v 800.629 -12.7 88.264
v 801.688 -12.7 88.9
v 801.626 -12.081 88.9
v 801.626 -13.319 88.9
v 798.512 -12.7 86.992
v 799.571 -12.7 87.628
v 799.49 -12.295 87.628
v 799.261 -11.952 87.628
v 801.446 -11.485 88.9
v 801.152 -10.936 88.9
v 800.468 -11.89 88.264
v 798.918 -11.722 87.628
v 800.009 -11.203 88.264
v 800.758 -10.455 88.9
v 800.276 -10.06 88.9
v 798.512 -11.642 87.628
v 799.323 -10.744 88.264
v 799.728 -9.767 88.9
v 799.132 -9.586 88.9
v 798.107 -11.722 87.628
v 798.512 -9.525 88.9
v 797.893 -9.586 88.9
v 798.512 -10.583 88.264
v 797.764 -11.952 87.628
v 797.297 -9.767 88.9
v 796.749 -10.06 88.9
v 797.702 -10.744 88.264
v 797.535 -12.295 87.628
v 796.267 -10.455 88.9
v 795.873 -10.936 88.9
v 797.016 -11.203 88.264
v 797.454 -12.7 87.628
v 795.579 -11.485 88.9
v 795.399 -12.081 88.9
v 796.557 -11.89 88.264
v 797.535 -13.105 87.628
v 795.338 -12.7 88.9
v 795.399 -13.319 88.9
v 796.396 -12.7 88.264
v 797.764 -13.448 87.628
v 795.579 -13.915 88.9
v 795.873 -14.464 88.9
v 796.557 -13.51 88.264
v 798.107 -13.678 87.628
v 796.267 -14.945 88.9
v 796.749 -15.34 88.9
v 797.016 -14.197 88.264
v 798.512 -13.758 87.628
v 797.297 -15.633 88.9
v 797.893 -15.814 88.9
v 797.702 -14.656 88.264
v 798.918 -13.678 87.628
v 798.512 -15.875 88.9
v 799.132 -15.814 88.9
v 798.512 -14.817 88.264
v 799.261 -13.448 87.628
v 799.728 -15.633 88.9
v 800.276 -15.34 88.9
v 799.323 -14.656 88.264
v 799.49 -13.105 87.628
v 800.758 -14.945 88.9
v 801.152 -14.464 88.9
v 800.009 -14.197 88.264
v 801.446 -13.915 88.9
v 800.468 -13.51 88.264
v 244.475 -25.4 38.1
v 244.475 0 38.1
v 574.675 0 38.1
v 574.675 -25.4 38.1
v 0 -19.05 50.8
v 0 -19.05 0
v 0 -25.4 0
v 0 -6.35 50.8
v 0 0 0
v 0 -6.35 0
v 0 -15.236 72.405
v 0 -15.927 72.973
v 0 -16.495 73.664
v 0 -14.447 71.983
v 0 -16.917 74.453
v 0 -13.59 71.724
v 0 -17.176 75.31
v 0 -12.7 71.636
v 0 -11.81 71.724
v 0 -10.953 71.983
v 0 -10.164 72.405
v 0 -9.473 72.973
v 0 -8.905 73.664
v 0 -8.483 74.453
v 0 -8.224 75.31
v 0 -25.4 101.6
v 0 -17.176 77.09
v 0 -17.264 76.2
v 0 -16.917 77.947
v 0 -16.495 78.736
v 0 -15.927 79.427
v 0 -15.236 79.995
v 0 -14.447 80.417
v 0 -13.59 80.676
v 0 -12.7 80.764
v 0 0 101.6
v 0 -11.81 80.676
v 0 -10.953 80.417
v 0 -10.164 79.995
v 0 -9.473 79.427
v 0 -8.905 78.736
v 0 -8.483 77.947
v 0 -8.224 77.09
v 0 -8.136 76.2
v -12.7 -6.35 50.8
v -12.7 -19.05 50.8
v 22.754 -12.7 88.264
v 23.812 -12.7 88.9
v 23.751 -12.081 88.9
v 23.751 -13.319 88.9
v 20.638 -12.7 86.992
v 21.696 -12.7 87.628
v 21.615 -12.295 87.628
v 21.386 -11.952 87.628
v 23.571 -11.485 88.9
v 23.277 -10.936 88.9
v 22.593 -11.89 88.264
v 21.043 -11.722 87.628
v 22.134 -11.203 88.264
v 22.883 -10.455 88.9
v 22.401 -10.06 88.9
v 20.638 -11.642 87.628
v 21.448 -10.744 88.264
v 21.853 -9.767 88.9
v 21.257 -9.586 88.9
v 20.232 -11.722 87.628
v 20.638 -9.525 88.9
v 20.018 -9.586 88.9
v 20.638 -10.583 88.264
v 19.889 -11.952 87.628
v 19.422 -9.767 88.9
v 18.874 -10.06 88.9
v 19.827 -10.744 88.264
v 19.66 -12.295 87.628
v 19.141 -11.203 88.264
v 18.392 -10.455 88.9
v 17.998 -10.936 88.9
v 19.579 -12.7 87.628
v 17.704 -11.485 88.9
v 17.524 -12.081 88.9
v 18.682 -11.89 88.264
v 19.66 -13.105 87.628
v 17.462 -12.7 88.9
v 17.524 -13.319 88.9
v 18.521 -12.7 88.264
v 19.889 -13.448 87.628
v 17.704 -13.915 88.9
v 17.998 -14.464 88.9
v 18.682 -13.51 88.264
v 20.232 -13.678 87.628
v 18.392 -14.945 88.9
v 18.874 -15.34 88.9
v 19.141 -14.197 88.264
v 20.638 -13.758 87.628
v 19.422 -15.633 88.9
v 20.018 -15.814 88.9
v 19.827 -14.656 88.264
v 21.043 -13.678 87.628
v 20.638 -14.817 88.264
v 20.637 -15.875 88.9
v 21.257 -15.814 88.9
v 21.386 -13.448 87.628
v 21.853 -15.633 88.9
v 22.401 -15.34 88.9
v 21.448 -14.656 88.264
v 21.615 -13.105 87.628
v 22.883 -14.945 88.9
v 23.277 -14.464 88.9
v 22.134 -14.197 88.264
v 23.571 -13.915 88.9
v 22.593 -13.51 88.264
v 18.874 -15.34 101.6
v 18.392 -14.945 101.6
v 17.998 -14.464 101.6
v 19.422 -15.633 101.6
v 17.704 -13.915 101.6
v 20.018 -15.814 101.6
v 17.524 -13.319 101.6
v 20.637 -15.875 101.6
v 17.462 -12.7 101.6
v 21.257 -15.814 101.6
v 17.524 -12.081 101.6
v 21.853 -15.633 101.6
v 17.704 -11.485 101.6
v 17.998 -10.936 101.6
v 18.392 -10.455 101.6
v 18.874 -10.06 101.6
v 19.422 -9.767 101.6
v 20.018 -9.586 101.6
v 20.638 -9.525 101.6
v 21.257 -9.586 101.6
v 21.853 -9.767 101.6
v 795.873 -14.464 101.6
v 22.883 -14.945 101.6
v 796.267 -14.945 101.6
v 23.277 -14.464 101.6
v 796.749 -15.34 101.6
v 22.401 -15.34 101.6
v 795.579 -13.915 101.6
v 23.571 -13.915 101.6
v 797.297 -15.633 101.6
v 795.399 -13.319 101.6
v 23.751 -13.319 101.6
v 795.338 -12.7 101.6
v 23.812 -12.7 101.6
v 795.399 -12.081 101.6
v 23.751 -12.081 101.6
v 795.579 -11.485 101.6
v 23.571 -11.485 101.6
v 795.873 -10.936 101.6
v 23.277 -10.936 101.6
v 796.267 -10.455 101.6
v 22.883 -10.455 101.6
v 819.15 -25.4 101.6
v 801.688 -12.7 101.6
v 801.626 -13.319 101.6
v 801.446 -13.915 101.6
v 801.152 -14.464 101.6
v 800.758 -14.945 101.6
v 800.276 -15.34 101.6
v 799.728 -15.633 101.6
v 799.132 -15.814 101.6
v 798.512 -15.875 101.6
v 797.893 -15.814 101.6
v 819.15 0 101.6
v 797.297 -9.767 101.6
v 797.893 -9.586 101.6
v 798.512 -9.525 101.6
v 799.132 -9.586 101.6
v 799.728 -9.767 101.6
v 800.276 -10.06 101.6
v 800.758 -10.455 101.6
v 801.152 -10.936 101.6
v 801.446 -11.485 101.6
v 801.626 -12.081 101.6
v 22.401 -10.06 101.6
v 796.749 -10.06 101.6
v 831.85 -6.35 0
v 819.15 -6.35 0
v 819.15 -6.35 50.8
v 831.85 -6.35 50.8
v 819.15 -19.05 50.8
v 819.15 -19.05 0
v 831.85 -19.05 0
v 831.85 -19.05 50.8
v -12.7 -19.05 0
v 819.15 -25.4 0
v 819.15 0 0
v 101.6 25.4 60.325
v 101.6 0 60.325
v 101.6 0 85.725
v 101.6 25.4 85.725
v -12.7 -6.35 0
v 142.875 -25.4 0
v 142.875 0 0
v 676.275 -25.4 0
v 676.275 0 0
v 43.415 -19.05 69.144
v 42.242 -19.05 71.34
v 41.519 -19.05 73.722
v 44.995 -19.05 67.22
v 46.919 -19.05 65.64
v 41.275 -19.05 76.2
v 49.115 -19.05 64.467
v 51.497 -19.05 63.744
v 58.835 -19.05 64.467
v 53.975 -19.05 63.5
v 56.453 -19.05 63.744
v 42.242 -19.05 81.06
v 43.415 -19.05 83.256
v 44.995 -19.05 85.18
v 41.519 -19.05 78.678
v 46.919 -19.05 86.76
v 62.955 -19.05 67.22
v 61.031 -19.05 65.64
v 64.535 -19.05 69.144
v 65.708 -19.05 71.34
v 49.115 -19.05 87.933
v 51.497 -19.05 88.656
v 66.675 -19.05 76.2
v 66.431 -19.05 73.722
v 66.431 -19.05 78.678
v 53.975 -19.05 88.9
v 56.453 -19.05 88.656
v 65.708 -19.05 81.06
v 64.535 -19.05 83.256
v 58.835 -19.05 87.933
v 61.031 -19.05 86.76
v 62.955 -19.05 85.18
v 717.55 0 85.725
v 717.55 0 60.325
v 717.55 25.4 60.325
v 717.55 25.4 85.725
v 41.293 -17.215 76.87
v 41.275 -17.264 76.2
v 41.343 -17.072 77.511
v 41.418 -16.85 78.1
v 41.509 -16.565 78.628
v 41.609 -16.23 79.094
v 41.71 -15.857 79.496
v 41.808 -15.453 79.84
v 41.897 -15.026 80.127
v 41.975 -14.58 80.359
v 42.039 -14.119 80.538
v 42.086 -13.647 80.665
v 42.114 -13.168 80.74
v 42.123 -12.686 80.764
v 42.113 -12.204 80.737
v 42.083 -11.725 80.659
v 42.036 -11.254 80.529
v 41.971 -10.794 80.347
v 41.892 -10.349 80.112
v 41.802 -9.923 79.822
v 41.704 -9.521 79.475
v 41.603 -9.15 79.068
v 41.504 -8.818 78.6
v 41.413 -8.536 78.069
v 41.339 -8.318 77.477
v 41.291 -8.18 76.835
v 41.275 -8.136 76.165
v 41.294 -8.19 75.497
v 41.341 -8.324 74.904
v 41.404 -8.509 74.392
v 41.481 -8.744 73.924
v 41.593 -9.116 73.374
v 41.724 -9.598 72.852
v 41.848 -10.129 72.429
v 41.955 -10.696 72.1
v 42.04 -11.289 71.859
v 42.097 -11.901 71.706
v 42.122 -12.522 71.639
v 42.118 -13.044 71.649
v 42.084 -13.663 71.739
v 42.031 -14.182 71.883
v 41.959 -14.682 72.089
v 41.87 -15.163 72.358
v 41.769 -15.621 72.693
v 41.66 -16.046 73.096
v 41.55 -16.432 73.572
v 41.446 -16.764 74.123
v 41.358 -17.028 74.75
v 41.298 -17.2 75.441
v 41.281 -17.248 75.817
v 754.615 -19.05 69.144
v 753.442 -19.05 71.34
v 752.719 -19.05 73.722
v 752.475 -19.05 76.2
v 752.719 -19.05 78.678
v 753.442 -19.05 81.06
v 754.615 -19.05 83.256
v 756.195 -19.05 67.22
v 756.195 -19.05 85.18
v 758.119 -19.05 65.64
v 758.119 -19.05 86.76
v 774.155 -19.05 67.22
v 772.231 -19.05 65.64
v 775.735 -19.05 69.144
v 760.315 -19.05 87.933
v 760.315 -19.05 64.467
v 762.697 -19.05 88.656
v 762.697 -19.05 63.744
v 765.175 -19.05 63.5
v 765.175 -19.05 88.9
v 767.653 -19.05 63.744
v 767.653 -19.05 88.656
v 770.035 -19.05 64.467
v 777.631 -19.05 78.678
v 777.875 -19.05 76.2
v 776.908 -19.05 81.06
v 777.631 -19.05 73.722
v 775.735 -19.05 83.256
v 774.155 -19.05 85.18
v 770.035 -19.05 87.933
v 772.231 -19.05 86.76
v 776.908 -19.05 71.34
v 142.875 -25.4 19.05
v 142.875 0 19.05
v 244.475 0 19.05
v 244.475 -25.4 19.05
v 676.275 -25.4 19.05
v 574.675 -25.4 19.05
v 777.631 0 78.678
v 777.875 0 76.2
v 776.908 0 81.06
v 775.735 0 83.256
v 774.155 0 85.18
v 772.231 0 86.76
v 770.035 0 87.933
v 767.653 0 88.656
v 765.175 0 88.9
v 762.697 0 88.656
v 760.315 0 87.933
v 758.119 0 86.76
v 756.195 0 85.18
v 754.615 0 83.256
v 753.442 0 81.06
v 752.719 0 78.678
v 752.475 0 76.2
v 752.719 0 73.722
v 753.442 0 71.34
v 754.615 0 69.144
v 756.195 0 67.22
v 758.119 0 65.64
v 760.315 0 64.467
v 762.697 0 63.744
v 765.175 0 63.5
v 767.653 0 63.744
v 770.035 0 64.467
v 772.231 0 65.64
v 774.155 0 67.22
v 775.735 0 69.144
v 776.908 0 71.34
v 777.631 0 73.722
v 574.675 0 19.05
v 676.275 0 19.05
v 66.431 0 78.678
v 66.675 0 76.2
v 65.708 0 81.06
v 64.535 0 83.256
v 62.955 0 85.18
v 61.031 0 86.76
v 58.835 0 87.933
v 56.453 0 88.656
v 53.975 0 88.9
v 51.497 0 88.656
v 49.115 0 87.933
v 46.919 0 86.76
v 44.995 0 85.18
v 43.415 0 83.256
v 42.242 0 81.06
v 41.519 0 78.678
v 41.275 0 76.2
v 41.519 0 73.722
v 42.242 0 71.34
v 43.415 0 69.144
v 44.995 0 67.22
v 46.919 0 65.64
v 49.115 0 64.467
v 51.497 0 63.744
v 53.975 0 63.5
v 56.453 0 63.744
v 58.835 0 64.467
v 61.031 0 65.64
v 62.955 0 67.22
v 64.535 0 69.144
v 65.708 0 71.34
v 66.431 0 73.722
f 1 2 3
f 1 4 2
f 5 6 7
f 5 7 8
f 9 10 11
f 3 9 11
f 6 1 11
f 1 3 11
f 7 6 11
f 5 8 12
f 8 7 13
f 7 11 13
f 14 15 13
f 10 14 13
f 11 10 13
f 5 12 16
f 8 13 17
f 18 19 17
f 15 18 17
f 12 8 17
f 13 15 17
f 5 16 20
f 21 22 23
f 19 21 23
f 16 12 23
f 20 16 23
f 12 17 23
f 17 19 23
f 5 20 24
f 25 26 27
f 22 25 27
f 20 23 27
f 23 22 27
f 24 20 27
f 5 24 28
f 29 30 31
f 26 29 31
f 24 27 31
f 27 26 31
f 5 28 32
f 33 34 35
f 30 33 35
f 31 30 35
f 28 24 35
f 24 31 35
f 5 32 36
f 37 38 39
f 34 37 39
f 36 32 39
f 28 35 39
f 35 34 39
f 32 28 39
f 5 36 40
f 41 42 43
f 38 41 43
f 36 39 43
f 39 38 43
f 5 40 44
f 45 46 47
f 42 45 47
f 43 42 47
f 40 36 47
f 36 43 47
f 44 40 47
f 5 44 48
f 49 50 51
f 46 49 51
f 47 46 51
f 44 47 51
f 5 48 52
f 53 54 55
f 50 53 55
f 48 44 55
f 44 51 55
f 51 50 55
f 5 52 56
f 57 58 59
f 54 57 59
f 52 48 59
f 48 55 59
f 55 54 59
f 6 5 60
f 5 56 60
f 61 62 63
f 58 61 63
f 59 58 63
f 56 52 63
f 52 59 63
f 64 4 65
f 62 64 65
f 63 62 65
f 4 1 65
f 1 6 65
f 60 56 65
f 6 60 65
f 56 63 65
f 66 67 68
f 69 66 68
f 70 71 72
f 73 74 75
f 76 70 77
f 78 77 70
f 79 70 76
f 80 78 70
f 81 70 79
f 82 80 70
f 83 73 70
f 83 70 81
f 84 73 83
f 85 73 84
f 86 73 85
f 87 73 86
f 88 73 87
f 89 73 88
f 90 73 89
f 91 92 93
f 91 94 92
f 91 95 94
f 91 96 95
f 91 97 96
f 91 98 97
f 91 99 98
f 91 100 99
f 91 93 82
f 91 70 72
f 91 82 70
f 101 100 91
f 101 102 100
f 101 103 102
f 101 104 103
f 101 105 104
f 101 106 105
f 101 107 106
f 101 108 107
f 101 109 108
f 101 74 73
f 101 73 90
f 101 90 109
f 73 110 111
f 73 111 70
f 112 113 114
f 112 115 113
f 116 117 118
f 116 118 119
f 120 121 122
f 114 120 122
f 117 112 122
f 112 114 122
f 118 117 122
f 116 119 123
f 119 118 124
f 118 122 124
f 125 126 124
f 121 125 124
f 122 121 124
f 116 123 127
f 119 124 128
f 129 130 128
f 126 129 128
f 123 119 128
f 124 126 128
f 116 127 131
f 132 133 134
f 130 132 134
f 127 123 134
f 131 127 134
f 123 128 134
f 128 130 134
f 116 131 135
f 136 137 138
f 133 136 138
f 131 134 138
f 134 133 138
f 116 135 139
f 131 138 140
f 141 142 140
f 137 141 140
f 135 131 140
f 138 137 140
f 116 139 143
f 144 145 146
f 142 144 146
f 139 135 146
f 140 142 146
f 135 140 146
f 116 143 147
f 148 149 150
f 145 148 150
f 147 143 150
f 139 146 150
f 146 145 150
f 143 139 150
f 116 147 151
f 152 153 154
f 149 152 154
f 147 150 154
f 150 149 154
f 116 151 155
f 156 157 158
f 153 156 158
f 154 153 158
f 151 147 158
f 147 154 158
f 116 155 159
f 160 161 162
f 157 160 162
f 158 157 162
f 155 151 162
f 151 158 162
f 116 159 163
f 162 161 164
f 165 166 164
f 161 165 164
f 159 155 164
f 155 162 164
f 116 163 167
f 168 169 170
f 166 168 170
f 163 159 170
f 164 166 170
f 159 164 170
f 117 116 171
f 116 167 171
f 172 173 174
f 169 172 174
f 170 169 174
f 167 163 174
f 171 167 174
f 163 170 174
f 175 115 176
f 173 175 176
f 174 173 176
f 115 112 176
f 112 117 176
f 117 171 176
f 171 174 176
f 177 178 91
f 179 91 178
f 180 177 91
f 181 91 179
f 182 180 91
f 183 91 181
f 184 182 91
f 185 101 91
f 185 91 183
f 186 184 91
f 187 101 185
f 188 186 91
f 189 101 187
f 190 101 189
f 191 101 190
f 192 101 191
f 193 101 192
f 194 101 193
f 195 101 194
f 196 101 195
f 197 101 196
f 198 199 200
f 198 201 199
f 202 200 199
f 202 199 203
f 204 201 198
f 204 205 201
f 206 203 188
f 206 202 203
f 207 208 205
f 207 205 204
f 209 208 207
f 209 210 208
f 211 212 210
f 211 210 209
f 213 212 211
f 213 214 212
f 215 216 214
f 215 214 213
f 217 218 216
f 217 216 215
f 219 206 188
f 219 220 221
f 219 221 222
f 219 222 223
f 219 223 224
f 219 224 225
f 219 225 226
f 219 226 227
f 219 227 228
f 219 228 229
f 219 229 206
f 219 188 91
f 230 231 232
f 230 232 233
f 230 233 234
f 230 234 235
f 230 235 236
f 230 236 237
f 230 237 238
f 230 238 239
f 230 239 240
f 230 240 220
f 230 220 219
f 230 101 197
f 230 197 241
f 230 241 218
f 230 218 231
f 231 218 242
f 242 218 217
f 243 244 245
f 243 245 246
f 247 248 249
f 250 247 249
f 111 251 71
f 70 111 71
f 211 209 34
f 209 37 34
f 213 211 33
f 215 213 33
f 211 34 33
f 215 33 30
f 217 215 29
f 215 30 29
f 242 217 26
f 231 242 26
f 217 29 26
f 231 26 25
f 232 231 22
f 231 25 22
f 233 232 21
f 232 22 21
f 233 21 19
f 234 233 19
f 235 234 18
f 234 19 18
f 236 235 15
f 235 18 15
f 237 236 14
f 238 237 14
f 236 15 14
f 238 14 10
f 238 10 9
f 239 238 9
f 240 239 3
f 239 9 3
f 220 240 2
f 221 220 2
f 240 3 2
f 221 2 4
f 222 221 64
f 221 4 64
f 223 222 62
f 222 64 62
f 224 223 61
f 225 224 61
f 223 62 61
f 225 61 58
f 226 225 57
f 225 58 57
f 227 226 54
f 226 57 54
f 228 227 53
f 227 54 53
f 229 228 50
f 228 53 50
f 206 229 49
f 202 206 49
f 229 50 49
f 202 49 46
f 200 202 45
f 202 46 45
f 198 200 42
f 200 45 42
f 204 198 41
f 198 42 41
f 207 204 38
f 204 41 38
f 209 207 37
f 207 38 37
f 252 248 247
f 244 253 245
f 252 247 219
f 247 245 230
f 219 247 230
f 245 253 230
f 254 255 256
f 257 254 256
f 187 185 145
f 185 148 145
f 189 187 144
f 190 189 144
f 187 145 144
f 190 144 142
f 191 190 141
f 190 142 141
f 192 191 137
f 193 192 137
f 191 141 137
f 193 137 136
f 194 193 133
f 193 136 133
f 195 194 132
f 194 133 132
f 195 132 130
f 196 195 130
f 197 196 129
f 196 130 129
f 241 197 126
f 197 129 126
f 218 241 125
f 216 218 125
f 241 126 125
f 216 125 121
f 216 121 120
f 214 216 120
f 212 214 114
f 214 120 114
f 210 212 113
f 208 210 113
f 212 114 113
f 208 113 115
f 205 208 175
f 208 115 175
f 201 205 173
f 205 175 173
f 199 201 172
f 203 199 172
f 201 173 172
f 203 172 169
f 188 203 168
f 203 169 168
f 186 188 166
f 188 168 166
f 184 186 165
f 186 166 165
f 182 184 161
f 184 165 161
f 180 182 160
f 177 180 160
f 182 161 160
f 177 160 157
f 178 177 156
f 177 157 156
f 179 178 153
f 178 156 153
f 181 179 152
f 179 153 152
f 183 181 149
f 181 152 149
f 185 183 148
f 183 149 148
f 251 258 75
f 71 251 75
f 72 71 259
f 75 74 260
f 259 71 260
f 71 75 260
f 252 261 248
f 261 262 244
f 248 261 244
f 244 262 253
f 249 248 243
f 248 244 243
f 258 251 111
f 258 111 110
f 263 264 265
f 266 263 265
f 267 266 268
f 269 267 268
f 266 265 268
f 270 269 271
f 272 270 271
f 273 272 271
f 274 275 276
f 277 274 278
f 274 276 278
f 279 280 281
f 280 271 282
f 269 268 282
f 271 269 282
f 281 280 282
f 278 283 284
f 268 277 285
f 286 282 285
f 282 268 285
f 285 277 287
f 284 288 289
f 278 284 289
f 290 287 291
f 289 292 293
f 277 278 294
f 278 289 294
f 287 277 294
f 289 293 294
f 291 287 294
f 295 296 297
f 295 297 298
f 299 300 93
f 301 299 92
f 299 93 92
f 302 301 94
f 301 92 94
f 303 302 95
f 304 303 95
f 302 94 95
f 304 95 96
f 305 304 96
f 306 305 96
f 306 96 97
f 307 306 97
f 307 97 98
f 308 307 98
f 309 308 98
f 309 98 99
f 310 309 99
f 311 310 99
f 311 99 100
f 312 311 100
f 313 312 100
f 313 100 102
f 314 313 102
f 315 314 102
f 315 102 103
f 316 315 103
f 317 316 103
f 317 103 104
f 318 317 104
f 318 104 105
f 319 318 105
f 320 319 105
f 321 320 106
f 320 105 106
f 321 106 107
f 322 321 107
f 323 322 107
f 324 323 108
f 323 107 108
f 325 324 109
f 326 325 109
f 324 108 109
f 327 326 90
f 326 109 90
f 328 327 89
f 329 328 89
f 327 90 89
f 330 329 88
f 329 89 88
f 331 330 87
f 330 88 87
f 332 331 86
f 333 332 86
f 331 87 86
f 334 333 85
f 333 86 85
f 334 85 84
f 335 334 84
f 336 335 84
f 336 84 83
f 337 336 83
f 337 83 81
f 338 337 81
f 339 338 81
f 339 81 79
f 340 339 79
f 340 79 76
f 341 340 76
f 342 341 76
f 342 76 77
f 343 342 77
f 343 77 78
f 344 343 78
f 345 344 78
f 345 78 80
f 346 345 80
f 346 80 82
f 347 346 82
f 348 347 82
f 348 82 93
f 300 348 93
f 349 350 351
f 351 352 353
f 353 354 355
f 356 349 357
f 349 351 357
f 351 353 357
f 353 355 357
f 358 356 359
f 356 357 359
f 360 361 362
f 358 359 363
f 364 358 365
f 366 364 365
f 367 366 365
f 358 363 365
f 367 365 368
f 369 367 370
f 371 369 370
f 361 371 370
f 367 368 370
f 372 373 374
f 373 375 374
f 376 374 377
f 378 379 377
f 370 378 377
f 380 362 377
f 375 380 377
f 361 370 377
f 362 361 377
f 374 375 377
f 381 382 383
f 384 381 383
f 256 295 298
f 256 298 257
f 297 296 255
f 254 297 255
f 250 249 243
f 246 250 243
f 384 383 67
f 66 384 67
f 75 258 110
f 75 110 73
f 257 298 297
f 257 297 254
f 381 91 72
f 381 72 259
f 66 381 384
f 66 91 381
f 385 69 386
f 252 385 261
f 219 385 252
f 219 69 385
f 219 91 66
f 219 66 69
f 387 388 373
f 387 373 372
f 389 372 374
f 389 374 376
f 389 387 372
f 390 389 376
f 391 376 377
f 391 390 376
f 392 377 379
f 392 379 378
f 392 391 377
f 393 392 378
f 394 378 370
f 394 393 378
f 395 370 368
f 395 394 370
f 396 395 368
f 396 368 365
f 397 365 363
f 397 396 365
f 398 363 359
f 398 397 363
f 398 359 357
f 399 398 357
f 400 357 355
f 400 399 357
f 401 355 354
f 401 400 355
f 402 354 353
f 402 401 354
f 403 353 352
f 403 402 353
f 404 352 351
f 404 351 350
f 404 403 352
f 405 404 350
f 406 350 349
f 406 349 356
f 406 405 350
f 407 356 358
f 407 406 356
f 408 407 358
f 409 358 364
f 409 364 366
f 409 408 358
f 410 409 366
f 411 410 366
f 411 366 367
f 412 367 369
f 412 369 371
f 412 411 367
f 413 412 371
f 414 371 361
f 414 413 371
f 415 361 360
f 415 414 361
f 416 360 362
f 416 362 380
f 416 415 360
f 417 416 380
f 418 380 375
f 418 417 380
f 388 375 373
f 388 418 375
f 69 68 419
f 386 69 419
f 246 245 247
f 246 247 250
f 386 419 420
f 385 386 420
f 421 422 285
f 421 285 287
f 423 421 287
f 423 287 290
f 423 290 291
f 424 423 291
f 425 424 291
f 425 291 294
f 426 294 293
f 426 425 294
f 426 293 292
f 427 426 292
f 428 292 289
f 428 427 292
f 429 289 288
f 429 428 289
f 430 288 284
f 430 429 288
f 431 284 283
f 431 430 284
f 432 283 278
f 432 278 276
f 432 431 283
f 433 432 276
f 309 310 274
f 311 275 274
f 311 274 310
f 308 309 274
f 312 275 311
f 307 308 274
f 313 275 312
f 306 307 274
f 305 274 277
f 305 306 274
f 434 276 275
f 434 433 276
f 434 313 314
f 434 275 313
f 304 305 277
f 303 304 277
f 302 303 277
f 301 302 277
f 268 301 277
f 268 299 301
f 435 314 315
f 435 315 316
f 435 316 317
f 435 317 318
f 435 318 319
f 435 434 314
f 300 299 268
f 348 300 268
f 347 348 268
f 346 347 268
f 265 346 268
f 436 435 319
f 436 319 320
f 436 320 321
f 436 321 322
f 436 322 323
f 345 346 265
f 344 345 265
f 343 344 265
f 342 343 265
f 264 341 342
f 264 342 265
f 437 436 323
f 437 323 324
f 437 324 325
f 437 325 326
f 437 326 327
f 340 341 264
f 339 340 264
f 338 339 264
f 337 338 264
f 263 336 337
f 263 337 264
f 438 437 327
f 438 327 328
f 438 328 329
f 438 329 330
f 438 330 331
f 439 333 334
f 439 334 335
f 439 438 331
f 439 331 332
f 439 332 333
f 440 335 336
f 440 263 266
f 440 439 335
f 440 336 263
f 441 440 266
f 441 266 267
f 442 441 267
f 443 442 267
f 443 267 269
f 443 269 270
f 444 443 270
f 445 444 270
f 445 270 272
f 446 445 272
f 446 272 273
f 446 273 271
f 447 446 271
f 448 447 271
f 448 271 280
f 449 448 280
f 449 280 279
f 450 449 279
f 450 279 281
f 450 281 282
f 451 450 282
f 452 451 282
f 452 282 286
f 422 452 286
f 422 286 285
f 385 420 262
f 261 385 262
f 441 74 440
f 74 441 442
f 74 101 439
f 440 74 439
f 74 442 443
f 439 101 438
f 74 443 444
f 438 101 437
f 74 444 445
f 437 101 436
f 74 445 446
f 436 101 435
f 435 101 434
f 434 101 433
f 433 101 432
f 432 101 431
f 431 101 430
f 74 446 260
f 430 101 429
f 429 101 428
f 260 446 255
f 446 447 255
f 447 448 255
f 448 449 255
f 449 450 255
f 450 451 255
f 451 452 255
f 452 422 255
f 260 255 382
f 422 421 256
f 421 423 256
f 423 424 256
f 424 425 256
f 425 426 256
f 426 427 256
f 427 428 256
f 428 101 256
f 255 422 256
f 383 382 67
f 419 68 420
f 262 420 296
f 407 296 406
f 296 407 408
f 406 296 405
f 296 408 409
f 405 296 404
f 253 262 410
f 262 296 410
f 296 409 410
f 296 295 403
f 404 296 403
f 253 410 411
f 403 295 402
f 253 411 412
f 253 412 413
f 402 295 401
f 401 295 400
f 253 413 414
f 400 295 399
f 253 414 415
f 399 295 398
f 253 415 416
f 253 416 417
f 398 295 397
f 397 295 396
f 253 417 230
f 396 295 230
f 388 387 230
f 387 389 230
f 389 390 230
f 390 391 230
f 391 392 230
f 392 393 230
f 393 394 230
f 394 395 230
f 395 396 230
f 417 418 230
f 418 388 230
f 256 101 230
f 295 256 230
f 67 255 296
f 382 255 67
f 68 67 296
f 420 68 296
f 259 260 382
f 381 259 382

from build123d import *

# Parameters (mm, degrees)
F0_W      = 819.15
F0_H      = 101.6
F1_DEPTH  = 25.4
F2_R      = 4.5640625
F3_DEPTH  = 50.8
F4_R      = 12.7
F5_DEPTH  = 19.05
F7_DEPTH  = 25.4
F9_D      = 6.35
F9_DEPTH  = 12.7
F9_TIP    = 1.9077324654
F10_W     = 12.7
F10_H     = 12.7
F11_DEPTH = 50.8
F12_W     = 615.95
F12_H     = 25.4
F13_DEPTH = 25.4


# Not quite as in the source:
# - a feature names something its author has since deleted; it is built from what else it names


with BuildPart() as f1:
    # F0 (on Front) → F1 (new body)
    with BuildSketch(Plane.XZ):
        with Locations((409.575, 50.8)):
            Rectangle(F0_W, F0_H)
    extrude(amount=F1_DEPTH)

    # F2 (on face) → F3 (cut)
    with BuildSketch(Plane(origin=(0, 0, 0), x_dir=(0, -1, 0), z_dir=(-1, 0, 0))):
        with Locations((12.7, 76.2)):
            Circle(F2_R)
    extrude(amount=-F3_DEPTH, mode=Mode.SUBTRACT)

    # F4 (on Front) → F5 (cut)
    with BuildSketch(Plane.XZ):
        with Locations((765.175, 76.2)):
            Circle(F4_R)
        with Locations((53.975, 76.2)):
            Circle(F4_R)
    extrude(amount=F5_DEPTH, mode=Mode.SUBTRACT)

    # F6 (on face) → F7 (cut, through all)
    with BuildSketch(Plane(origin=(0, 0, 0), x_dir=(-1, 0, 0), z_dir=(0, 1, 0))):
        Polygon((-676.275, 19.05), (-676.275, 0), (-142.875, 0), (-142.875, 19.05), (-244.475, 19.05), (-244.475, 38.1), (-574.675, 38.1), (-574.675, 19.05), align=None)
    extrude(amount=-F7_DEPTH, mode=Mode.SUBTRACT)

    # F9
    with Locations(Plane.XY.offset(101.6)):
        with Locations((20.6375, -12.7), (798.5125, -12.7)):
            Hole(F9_D / 2, depth=F9_DEPTH)
            with Locations((0, 0, -(F9_DEPTH + F9_TIP / 2))):  # 118° drill point
                Cone(0, F9_D / 2, F9_TIP, mode=Mode.SUBTRACT)

    # F10 (on Top) → F11 (join)
    with BuildSketch(Plane.XY):
        with Locations((-6.35, -12.7)):
            Rectangle(F10_W, F10_H)
        with Locations((825.5, -12.7)):
            Rectangle(F10_W, F10_H)
    extrude(amount=F11_DEPTH)

    # F12 (on face) → F13 (join)
    with BuildSketch(Plane(origin=(0, 0, 0), x_dir=(-1, 0, 0), z_dir=(0, 1, 0))):
        with Locations((-409.575, 73.025)):
            Rectangle(F12_W, F12_H)
    extrude(amount=F13_DEPTH)


solid = f1.part
